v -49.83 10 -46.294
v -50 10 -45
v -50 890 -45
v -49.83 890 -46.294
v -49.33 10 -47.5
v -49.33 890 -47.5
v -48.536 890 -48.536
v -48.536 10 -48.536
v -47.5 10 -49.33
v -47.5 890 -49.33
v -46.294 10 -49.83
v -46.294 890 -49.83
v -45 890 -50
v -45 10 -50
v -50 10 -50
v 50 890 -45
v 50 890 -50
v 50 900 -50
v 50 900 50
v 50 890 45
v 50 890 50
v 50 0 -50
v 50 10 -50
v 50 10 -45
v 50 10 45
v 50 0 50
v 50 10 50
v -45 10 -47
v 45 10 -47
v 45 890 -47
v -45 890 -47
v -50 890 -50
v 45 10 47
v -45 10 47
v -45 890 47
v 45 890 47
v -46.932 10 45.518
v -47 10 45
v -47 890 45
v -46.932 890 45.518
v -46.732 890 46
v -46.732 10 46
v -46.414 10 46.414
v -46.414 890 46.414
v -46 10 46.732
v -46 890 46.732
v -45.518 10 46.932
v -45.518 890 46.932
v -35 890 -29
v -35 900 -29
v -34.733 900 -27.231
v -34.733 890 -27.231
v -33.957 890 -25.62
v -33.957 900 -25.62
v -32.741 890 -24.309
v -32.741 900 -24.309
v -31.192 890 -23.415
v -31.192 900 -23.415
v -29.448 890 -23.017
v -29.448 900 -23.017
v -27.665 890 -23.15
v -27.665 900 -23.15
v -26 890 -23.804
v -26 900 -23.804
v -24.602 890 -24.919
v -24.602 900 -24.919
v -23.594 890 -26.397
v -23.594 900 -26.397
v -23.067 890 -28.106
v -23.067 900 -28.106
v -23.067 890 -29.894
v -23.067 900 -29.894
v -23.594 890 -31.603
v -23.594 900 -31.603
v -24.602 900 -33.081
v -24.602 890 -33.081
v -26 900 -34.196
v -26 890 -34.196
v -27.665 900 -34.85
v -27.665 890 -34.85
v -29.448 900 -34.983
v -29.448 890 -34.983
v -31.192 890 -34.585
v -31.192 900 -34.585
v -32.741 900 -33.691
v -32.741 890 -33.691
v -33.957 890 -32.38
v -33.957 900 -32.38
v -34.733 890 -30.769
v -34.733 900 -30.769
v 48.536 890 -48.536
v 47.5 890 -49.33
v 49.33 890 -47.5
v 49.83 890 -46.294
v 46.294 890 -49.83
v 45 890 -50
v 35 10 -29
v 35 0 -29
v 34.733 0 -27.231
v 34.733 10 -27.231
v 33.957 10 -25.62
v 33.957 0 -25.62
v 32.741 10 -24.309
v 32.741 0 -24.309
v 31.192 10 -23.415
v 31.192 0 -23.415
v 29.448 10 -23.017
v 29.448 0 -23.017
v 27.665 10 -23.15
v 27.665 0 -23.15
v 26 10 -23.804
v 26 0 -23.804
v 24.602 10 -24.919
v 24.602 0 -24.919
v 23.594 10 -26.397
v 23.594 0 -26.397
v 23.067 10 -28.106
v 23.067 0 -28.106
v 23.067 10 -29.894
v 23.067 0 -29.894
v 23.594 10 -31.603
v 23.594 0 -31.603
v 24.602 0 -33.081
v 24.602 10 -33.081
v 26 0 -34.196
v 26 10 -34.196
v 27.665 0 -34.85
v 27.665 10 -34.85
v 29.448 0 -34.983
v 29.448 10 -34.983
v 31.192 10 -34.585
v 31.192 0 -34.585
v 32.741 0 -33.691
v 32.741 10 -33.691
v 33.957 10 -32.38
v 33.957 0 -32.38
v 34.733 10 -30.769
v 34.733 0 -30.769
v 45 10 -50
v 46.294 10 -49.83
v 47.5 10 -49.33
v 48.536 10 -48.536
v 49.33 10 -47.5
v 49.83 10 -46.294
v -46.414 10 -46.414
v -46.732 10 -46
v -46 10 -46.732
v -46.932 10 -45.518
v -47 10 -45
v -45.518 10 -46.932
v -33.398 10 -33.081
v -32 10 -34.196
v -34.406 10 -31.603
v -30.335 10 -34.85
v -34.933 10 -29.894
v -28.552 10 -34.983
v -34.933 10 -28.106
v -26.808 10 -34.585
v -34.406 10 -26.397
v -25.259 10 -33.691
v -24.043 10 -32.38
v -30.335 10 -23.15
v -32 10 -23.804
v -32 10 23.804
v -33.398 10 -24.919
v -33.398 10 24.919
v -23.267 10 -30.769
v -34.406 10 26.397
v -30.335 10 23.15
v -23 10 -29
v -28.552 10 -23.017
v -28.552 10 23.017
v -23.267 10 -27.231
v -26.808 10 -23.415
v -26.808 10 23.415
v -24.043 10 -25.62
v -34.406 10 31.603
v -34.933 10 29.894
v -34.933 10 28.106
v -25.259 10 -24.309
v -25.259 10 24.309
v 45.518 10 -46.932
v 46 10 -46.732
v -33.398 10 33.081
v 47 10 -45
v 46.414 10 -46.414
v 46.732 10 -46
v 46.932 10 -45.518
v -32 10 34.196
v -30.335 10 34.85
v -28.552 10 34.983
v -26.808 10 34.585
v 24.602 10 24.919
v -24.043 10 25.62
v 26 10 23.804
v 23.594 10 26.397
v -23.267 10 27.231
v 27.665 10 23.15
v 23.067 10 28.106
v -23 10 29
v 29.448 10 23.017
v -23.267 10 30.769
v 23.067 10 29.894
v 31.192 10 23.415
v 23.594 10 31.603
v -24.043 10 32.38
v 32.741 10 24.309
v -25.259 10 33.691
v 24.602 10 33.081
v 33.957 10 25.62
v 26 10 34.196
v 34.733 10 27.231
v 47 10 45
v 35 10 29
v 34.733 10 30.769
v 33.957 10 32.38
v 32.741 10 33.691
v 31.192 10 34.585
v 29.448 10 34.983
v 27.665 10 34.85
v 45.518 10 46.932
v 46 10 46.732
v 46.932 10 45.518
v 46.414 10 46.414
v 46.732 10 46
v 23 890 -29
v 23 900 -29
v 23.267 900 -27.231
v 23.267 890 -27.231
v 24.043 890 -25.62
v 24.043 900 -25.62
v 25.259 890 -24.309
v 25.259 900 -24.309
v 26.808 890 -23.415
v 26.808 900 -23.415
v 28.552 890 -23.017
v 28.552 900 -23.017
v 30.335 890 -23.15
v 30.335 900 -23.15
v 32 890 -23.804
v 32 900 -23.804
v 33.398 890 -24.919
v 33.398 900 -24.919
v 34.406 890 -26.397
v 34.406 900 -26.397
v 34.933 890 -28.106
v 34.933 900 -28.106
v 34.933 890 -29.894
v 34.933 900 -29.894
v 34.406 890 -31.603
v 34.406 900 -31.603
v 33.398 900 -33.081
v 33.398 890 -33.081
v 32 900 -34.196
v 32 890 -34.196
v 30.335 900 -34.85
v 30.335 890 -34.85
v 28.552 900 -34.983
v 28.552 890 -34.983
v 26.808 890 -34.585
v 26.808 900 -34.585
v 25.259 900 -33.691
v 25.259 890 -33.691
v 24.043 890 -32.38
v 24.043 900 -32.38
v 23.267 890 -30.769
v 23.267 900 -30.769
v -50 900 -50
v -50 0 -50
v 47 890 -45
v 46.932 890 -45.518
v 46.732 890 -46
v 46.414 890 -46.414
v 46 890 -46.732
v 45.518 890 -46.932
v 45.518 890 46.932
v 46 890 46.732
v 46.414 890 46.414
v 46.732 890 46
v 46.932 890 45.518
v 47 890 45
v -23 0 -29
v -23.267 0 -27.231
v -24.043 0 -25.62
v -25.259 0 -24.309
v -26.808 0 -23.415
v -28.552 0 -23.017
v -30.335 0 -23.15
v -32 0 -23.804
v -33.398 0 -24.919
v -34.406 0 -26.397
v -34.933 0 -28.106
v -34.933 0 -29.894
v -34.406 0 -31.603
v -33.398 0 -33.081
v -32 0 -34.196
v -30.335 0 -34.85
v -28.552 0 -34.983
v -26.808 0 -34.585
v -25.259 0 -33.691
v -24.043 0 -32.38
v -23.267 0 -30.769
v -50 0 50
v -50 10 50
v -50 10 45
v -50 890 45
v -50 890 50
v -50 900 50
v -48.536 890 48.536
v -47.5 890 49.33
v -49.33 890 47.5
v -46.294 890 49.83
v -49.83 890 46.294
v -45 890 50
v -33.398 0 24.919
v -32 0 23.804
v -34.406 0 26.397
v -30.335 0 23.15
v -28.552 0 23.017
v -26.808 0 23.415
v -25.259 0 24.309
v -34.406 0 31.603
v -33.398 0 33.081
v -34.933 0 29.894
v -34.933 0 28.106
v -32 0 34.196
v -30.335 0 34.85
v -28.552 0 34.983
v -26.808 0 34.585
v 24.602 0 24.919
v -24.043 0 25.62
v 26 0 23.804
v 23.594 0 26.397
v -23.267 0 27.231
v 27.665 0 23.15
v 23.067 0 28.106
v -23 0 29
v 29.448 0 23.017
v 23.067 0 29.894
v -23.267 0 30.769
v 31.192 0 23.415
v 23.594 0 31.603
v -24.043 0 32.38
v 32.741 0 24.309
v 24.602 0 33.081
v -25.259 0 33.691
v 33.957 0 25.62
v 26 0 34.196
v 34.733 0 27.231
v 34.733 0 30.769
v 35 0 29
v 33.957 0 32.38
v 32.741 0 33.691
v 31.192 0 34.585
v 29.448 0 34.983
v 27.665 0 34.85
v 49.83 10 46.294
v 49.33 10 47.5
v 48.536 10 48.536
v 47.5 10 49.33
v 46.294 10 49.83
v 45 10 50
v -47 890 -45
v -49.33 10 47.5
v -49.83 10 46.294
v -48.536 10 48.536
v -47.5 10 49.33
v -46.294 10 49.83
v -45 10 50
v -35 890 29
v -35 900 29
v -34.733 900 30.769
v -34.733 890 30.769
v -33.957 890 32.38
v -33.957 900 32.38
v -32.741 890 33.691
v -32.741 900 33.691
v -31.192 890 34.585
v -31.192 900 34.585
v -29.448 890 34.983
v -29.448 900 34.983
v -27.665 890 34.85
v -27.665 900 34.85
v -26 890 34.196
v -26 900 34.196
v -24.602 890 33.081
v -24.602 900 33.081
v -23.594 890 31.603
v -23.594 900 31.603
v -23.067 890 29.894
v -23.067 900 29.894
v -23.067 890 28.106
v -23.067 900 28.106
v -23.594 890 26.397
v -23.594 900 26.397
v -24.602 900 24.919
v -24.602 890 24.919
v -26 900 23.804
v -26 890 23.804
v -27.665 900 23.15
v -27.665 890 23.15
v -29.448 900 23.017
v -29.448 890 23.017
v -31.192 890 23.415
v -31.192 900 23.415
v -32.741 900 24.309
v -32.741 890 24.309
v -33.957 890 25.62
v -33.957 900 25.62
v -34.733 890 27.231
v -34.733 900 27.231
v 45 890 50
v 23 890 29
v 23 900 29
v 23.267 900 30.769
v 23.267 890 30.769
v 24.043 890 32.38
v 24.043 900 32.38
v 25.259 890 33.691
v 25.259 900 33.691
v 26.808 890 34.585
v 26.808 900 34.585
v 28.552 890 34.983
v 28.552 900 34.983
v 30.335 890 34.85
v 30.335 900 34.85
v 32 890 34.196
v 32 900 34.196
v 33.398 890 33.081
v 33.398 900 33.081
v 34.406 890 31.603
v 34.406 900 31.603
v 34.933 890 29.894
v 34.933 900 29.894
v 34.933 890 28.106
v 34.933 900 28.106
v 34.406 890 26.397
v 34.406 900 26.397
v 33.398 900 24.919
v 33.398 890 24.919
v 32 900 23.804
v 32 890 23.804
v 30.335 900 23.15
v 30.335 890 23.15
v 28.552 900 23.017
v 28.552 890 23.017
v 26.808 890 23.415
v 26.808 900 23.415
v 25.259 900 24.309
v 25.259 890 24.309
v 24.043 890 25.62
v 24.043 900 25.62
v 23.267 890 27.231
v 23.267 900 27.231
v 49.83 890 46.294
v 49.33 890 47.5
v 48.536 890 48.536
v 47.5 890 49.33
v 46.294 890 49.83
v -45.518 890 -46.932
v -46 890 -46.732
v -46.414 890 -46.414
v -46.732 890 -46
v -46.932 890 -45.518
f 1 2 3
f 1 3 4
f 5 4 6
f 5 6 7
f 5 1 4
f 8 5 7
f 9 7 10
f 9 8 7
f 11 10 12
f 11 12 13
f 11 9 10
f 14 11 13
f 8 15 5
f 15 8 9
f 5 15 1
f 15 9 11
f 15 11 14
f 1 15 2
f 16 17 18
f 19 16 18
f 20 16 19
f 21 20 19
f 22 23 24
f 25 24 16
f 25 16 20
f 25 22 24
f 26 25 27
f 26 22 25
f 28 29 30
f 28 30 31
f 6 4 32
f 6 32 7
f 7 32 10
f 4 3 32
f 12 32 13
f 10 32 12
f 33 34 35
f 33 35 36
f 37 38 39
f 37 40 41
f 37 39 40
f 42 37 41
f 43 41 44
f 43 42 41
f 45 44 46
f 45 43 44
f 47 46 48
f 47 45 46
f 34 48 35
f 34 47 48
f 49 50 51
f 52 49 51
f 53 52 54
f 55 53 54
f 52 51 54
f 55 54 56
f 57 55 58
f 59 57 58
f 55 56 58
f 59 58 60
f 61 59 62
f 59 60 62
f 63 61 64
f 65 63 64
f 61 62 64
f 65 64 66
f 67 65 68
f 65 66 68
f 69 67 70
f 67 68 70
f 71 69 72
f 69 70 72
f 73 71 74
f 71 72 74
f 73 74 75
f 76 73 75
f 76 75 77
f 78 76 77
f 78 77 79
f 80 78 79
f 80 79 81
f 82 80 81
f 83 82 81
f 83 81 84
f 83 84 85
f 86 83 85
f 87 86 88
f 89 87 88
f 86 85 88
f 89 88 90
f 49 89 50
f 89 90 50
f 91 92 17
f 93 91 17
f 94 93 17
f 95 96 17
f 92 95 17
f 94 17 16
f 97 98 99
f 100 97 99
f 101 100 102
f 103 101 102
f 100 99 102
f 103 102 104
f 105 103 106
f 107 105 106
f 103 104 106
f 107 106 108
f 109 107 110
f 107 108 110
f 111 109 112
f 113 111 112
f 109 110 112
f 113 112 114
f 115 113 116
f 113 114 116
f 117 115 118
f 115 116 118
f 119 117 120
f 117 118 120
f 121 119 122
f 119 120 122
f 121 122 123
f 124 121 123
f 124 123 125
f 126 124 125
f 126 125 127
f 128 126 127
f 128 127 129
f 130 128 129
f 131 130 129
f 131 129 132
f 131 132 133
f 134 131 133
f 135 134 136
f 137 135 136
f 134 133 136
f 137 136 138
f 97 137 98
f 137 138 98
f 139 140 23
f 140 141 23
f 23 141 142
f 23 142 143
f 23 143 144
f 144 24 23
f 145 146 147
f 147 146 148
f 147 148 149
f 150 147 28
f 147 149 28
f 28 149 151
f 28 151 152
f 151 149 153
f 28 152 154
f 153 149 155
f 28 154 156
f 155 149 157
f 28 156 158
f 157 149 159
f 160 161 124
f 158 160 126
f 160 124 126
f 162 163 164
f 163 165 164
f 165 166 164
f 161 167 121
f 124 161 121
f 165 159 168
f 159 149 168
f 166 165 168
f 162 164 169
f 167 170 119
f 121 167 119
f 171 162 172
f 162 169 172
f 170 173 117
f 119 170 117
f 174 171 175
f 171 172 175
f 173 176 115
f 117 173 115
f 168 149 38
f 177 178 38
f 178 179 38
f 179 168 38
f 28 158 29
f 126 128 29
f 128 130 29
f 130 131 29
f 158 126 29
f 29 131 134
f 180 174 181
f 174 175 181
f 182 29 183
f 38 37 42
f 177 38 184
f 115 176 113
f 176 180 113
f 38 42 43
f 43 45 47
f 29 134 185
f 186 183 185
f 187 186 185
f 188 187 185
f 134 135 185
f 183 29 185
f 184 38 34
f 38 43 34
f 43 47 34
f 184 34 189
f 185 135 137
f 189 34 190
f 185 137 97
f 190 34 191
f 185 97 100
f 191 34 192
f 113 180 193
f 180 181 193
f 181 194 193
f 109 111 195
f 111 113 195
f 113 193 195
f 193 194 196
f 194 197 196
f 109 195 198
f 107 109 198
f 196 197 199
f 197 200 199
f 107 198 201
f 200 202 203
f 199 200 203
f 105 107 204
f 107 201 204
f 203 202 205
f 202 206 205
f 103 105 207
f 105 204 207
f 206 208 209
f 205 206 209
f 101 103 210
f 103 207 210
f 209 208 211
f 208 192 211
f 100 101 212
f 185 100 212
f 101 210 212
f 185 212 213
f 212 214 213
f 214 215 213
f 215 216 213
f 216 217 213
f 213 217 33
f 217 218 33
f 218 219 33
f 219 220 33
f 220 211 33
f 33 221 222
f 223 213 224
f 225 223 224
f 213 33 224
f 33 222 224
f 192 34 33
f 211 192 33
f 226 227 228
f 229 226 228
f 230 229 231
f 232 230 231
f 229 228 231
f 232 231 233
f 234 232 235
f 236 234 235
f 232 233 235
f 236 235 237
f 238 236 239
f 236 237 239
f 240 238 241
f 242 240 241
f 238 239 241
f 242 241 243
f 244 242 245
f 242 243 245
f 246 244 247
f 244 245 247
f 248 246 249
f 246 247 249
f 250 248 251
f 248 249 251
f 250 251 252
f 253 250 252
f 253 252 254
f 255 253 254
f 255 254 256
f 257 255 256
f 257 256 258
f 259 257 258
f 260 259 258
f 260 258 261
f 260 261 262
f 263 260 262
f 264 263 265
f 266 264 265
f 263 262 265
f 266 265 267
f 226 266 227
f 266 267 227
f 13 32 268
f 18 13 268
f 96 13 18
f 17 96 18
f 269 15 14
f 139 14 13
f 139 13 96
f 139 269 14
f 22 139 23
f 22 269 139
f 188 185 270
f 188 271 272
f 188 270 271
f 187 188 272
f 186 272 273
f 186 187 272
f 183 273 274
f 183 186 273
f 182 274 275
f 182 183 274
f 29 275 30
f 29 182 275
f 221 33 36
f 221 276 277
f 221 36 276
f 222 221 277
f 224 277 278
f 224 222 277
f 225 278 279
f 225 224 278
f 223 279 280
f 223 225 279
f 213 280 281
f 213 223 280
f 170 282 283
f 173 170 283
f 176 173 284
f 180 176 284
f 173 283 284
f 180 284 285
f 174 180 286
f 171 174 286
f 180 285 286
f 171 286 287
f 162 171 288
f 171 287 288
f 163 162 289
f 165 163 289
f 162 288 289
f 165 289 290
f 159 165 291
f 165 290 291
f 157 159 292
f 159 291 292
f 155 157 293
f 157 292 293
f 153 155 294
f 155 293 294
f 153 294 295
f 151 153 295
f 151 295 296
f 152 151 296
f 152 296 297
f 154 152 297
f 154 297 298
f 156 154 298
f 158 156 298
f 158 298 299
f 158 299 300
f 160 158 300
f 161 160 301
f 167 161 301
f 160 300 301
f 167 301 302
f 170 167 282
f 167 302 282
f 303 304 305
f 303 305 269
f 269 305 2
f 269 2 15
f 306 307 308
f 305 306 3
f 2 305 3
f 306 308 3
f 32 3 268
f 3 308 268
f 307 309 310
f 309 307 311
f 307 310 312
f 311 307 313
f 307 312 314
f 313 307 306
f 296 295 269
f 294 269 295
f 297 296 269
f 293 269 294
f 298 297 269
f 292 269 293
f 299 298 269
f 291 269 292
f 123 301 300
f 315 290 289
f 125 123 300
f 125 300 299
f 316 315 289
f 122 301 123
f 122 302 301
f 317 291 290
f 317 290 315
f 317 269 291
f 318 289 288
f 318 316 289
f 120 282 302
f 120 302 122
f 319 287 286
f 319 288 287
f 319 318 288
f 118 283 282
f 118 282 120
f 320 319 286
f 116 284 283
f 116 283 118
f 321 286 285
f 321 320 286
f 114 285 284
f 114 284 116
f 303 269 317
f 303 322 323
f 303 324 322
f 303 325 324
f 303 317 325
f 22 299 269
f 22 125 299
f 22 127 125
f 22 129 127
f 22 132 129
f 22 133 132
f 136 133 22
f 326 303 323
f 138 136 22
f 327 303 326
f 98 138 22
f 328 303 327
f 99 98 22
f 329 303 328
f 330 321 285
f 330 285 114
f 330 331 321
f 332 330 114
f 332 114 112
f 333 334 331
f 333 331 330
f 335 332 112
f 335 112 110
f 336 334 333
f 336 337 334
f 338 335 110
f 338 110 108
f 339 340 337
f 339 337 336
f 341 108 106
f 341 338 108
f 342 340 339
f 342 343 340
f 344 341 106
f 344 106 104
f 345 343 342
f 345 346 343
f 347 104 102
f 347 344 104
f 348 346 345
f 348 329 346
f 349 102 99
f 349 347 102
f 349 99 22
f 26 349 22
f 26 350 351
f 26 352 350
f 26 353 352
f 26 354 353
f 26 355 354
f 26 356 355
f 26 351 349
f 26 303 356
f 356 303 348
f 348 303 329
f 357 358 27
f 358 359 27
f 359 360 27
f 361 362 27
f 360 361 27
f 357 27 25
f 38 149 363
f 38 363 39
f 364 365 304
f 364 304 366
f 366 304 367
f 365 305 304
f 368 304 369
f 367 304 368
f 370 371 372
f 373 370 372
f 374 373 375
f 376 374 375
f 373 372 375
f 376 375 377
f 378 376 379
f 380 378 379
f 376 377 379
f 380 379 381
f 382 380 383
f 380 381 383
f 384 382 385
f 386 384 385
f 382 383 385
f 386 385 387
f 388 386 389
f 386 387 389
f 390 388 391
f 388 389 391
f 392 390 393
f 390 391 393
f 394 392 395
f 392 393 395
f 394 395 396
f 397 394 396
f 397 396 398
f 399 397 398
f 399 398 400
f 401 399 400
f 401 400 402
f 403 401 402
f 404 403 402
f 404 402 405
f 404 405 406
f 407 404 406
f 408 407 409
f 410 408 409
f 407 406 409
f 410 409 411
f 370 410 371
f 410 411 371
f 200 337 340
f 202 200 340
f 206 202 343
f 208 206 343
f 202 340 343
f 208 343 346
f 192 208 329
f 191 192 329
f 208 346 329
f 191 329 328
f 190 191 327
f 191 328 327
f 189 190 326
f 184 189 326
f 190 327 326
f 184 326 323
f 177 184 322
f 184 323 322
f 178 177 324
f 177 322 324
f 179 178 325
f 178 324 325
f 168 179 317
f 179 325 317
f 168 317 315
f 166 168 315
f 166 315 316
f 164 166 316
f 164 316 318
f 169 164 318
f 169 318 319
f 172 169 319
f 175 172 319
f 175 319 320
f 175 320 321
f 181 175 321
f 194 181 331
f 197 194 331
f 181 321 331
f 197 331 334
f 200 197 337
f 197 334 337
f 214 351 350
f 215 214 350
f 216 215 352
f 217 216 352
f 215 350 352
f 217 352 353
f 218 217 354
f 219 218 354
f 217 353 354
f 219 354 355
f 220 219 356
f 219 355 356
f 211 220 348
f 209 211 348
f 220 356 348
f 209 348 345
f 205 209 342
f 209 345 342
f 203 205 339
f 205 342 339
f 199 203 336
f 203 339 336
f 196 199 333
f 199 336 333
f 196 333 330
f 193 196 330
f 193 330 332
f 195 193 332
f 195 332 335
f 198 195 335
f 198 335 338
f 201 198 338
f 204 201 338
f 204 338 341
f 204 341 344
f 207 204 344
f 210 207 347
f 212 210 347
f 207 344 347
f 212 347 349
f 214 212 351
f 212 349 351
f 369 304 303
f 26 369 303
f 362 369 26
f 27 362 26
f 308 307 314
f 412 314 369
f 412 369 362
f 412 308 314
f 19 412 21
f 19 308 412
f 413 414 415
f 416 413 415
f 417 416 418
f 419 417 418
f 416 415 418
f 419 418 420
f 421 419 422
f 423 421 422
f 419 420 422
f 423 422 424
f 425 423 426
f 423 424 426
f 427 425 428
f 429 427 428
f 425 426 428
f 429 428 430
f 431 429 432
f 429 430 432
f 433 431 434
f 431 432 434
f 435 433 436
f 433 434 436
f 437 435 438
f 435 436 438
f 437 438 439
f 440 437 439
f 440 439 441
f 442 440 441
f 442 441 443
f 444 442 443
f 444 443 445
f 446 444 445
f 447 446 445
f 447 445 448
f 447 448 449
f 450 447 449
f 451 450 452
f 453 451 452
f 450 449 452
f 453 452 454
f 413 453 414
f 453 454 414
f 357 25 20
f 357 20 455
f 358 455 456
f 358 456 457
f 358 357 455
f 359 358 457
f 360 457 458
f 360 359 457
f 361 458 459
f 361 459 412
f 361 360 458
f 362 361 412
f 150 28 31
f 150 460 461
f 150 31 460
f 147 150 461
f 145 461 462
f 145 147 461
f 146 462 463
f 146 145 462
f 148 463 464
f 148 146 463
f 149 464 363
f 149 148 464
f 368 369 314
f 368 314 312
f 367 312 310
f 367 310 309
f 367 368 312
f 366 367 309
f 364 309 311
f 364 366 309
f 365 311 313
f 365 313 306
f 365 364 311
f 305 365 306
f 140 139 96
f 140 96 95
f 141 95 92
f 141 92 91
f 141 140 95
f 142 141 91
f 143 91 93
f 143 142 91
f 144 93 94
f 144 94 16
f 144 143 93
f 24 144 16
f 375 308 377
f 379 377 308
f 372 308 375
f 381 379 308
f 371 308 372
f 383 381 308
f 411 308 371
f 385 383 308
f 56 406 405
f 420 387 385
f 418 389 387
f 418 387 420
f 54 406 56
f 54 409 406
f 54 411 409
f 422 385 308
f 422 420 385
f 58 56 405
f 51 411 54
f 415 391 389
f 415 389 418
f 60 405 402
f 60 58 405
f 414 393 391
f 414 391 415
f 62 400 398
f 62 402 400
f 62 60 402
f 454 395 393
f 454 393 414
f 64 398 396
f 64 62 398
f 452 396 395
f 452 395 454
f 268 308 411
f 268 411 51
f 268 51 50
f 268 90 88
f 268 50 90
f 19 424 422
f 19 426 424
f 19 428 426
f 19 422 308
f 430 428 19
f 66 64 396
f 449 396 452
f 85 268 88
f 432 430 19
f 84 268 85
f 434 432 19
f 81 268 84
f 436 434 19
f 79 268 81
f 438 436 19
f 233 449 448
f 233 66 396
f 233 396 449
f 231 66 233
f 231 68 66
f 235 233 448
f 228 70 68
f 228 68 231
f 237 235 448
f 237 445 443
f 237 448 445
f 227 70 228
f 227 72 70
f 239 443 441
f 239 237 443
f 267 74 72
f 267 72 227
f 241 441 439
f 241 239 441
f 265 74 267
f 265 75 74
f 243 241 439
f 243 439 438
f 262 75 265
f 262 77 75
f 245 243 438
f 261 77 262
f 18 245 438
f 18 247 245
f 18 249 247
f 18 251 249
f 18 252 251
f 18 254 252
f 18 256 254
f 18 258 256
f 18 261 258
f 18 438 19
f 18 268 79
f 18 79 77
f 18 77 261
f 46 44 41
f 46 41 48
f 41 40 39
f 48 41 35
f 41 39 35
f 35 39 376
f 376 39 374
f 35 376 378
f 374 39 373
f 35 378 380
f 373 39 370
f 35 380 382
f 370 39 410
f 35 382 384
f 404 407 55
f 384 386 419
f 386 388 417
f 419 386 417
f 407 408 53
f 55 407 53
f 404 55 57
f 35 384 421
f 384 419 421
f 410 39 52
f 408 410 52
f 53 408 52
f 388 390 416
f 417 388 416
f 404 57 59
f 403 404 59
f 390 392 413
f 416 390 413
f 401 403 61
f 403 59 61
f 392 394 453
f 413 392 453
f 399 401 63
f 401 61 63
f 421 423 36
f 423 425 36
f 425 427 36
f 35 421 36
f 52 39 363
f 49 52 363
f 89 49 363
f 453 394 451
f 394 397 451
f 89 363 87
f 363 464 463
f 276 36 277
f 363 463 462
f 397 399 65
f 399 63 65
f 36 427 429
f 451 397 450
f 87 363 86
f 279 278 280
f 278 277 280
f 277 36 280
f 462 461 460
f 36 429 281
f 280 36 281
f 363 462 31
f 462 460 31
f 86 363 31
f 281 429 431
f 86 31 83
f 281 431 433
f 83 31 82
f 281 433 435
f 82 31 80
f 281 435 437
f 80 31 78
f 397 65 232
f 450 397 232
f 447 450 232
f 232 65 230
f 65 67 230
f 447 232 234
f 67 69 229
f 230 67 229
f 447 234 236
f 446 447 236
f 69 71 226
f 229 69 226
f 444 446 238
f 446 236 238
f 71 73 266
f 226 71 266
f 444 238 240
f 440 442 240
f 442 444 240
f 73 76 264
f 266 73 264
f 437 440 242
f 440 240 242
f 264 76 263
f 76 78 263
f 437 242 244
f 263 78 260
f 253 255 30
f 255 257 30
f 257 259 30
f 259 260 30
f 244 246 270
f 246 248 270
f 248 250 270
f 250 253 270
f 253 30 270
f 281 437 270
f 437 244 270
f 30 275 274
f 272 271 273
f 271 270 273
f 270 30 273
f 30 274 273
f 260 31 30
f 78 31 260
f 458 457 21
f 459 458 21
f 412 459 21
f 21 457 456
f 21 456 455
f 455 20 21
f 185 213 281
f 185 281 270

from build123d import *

# Parameters (mm, degrees)
F1_DEPTH  = 900
F3_W      = 100
F3_H      = 100
F4_DEPTH  = 10
F6_W      = 100
F6_H      = 100
F7_DEPTH  = 10
F8_R      = 6
F9_DEPTH  = 10
F10_R     = 6
F11_DEPTH = 10


with BuildPart() as f1:
    # F0 (on Front) → F1 (new body)
    with BuildSketch(Plane.XZ):
        with BuildLine():
            ThreePointArc((50, 45), (48.535534, 48.535534), (45, 50))
            Line((45, 50), (-45, 50))
            ThreePointArc((-45, 50), (-48.535534, 48.535534), (-50, 45))
            Line((-50, 45), (-50, -45))
            ThreePointArc((-50, -45), (-48.535534, -48.535534), (-45, -50))
            Line((-45, -50), (45, -50))
            ThreePointArc((45, -50), (48.535534, -48.535534), (50, -45))
            Line((50, -45), (50, 45))
        make_face()
        with BuildLine():
            ThreePointArc((-47, 45), (-46.414214, 46.414214), (-45, 47))
            Line((-45, 47), (45, 47))
            ThreePointArc((45, 47), (46.414214, 46.414214), (47, 45))
            Line((47, 45), (47, -45))
            ThreePointArc((47, -45), (46.414214, -46.414214), (45, -47))
            Line((45, -47), (-45, -47))
            ThreePointArc((-45, -47), (-46.414214, -46.414214), (-47, -45))
            Line((-47, -45), (-47, 45))
        make_face(mode=Mode.SUBTRACT)
    extrude(amount=-F1_DEPTH)

    # F3 (on offset) → F4 (join)
    with BuildSketch(Plane.XZ):
        Rectangle(F3_W, F3_H)
    extrude(amount=-F4_DEPTH)

    # F6 (on offset) → F7 (join)
    with BuildSketch(Plane(origin=(0, 900, 0), x_dir=(1, 0, 0), z_dir=(0, 1, 0))):
        Rectangle(F6_W, F6_H)
    extrude(amount=-F7_DEPTH)

    # F8 (on face) → F9 (cut, through all)
    with BuildSketch(Plane(origin=(0, 900, 0), x_dir=(-1, 0, 0), z_dir=(0, 1, 0))):
        with Locations((-29, 29)):
            Circle(F8_R)
        with Locations((29, 29)):
            Circle(F8_R)
        with Locations((29, -29)):
            Circle(F8_R)
        with Locations((-29, -29)):
            Circle(F8_R)
    extrude(amount=-F9_DEPTH, mode=Mode.SUBTRACT)

    # F10 (on face) → F11 (cut, through all)
    with BuildSketch(Plane.XZ):
        with Locations((-29, 29)):
            Circle(F10_R)
        with Locations((29, 29)):
            Circle(F10_R)
        with Locations((29, -29)):
            Circle(F10_R)
        with Locations((-29, -29)):
            Circle(F10_R)
    extrude(amount=-F11_DEPTH, mode=Mode.SUBTRACT)


solid = f1.part
